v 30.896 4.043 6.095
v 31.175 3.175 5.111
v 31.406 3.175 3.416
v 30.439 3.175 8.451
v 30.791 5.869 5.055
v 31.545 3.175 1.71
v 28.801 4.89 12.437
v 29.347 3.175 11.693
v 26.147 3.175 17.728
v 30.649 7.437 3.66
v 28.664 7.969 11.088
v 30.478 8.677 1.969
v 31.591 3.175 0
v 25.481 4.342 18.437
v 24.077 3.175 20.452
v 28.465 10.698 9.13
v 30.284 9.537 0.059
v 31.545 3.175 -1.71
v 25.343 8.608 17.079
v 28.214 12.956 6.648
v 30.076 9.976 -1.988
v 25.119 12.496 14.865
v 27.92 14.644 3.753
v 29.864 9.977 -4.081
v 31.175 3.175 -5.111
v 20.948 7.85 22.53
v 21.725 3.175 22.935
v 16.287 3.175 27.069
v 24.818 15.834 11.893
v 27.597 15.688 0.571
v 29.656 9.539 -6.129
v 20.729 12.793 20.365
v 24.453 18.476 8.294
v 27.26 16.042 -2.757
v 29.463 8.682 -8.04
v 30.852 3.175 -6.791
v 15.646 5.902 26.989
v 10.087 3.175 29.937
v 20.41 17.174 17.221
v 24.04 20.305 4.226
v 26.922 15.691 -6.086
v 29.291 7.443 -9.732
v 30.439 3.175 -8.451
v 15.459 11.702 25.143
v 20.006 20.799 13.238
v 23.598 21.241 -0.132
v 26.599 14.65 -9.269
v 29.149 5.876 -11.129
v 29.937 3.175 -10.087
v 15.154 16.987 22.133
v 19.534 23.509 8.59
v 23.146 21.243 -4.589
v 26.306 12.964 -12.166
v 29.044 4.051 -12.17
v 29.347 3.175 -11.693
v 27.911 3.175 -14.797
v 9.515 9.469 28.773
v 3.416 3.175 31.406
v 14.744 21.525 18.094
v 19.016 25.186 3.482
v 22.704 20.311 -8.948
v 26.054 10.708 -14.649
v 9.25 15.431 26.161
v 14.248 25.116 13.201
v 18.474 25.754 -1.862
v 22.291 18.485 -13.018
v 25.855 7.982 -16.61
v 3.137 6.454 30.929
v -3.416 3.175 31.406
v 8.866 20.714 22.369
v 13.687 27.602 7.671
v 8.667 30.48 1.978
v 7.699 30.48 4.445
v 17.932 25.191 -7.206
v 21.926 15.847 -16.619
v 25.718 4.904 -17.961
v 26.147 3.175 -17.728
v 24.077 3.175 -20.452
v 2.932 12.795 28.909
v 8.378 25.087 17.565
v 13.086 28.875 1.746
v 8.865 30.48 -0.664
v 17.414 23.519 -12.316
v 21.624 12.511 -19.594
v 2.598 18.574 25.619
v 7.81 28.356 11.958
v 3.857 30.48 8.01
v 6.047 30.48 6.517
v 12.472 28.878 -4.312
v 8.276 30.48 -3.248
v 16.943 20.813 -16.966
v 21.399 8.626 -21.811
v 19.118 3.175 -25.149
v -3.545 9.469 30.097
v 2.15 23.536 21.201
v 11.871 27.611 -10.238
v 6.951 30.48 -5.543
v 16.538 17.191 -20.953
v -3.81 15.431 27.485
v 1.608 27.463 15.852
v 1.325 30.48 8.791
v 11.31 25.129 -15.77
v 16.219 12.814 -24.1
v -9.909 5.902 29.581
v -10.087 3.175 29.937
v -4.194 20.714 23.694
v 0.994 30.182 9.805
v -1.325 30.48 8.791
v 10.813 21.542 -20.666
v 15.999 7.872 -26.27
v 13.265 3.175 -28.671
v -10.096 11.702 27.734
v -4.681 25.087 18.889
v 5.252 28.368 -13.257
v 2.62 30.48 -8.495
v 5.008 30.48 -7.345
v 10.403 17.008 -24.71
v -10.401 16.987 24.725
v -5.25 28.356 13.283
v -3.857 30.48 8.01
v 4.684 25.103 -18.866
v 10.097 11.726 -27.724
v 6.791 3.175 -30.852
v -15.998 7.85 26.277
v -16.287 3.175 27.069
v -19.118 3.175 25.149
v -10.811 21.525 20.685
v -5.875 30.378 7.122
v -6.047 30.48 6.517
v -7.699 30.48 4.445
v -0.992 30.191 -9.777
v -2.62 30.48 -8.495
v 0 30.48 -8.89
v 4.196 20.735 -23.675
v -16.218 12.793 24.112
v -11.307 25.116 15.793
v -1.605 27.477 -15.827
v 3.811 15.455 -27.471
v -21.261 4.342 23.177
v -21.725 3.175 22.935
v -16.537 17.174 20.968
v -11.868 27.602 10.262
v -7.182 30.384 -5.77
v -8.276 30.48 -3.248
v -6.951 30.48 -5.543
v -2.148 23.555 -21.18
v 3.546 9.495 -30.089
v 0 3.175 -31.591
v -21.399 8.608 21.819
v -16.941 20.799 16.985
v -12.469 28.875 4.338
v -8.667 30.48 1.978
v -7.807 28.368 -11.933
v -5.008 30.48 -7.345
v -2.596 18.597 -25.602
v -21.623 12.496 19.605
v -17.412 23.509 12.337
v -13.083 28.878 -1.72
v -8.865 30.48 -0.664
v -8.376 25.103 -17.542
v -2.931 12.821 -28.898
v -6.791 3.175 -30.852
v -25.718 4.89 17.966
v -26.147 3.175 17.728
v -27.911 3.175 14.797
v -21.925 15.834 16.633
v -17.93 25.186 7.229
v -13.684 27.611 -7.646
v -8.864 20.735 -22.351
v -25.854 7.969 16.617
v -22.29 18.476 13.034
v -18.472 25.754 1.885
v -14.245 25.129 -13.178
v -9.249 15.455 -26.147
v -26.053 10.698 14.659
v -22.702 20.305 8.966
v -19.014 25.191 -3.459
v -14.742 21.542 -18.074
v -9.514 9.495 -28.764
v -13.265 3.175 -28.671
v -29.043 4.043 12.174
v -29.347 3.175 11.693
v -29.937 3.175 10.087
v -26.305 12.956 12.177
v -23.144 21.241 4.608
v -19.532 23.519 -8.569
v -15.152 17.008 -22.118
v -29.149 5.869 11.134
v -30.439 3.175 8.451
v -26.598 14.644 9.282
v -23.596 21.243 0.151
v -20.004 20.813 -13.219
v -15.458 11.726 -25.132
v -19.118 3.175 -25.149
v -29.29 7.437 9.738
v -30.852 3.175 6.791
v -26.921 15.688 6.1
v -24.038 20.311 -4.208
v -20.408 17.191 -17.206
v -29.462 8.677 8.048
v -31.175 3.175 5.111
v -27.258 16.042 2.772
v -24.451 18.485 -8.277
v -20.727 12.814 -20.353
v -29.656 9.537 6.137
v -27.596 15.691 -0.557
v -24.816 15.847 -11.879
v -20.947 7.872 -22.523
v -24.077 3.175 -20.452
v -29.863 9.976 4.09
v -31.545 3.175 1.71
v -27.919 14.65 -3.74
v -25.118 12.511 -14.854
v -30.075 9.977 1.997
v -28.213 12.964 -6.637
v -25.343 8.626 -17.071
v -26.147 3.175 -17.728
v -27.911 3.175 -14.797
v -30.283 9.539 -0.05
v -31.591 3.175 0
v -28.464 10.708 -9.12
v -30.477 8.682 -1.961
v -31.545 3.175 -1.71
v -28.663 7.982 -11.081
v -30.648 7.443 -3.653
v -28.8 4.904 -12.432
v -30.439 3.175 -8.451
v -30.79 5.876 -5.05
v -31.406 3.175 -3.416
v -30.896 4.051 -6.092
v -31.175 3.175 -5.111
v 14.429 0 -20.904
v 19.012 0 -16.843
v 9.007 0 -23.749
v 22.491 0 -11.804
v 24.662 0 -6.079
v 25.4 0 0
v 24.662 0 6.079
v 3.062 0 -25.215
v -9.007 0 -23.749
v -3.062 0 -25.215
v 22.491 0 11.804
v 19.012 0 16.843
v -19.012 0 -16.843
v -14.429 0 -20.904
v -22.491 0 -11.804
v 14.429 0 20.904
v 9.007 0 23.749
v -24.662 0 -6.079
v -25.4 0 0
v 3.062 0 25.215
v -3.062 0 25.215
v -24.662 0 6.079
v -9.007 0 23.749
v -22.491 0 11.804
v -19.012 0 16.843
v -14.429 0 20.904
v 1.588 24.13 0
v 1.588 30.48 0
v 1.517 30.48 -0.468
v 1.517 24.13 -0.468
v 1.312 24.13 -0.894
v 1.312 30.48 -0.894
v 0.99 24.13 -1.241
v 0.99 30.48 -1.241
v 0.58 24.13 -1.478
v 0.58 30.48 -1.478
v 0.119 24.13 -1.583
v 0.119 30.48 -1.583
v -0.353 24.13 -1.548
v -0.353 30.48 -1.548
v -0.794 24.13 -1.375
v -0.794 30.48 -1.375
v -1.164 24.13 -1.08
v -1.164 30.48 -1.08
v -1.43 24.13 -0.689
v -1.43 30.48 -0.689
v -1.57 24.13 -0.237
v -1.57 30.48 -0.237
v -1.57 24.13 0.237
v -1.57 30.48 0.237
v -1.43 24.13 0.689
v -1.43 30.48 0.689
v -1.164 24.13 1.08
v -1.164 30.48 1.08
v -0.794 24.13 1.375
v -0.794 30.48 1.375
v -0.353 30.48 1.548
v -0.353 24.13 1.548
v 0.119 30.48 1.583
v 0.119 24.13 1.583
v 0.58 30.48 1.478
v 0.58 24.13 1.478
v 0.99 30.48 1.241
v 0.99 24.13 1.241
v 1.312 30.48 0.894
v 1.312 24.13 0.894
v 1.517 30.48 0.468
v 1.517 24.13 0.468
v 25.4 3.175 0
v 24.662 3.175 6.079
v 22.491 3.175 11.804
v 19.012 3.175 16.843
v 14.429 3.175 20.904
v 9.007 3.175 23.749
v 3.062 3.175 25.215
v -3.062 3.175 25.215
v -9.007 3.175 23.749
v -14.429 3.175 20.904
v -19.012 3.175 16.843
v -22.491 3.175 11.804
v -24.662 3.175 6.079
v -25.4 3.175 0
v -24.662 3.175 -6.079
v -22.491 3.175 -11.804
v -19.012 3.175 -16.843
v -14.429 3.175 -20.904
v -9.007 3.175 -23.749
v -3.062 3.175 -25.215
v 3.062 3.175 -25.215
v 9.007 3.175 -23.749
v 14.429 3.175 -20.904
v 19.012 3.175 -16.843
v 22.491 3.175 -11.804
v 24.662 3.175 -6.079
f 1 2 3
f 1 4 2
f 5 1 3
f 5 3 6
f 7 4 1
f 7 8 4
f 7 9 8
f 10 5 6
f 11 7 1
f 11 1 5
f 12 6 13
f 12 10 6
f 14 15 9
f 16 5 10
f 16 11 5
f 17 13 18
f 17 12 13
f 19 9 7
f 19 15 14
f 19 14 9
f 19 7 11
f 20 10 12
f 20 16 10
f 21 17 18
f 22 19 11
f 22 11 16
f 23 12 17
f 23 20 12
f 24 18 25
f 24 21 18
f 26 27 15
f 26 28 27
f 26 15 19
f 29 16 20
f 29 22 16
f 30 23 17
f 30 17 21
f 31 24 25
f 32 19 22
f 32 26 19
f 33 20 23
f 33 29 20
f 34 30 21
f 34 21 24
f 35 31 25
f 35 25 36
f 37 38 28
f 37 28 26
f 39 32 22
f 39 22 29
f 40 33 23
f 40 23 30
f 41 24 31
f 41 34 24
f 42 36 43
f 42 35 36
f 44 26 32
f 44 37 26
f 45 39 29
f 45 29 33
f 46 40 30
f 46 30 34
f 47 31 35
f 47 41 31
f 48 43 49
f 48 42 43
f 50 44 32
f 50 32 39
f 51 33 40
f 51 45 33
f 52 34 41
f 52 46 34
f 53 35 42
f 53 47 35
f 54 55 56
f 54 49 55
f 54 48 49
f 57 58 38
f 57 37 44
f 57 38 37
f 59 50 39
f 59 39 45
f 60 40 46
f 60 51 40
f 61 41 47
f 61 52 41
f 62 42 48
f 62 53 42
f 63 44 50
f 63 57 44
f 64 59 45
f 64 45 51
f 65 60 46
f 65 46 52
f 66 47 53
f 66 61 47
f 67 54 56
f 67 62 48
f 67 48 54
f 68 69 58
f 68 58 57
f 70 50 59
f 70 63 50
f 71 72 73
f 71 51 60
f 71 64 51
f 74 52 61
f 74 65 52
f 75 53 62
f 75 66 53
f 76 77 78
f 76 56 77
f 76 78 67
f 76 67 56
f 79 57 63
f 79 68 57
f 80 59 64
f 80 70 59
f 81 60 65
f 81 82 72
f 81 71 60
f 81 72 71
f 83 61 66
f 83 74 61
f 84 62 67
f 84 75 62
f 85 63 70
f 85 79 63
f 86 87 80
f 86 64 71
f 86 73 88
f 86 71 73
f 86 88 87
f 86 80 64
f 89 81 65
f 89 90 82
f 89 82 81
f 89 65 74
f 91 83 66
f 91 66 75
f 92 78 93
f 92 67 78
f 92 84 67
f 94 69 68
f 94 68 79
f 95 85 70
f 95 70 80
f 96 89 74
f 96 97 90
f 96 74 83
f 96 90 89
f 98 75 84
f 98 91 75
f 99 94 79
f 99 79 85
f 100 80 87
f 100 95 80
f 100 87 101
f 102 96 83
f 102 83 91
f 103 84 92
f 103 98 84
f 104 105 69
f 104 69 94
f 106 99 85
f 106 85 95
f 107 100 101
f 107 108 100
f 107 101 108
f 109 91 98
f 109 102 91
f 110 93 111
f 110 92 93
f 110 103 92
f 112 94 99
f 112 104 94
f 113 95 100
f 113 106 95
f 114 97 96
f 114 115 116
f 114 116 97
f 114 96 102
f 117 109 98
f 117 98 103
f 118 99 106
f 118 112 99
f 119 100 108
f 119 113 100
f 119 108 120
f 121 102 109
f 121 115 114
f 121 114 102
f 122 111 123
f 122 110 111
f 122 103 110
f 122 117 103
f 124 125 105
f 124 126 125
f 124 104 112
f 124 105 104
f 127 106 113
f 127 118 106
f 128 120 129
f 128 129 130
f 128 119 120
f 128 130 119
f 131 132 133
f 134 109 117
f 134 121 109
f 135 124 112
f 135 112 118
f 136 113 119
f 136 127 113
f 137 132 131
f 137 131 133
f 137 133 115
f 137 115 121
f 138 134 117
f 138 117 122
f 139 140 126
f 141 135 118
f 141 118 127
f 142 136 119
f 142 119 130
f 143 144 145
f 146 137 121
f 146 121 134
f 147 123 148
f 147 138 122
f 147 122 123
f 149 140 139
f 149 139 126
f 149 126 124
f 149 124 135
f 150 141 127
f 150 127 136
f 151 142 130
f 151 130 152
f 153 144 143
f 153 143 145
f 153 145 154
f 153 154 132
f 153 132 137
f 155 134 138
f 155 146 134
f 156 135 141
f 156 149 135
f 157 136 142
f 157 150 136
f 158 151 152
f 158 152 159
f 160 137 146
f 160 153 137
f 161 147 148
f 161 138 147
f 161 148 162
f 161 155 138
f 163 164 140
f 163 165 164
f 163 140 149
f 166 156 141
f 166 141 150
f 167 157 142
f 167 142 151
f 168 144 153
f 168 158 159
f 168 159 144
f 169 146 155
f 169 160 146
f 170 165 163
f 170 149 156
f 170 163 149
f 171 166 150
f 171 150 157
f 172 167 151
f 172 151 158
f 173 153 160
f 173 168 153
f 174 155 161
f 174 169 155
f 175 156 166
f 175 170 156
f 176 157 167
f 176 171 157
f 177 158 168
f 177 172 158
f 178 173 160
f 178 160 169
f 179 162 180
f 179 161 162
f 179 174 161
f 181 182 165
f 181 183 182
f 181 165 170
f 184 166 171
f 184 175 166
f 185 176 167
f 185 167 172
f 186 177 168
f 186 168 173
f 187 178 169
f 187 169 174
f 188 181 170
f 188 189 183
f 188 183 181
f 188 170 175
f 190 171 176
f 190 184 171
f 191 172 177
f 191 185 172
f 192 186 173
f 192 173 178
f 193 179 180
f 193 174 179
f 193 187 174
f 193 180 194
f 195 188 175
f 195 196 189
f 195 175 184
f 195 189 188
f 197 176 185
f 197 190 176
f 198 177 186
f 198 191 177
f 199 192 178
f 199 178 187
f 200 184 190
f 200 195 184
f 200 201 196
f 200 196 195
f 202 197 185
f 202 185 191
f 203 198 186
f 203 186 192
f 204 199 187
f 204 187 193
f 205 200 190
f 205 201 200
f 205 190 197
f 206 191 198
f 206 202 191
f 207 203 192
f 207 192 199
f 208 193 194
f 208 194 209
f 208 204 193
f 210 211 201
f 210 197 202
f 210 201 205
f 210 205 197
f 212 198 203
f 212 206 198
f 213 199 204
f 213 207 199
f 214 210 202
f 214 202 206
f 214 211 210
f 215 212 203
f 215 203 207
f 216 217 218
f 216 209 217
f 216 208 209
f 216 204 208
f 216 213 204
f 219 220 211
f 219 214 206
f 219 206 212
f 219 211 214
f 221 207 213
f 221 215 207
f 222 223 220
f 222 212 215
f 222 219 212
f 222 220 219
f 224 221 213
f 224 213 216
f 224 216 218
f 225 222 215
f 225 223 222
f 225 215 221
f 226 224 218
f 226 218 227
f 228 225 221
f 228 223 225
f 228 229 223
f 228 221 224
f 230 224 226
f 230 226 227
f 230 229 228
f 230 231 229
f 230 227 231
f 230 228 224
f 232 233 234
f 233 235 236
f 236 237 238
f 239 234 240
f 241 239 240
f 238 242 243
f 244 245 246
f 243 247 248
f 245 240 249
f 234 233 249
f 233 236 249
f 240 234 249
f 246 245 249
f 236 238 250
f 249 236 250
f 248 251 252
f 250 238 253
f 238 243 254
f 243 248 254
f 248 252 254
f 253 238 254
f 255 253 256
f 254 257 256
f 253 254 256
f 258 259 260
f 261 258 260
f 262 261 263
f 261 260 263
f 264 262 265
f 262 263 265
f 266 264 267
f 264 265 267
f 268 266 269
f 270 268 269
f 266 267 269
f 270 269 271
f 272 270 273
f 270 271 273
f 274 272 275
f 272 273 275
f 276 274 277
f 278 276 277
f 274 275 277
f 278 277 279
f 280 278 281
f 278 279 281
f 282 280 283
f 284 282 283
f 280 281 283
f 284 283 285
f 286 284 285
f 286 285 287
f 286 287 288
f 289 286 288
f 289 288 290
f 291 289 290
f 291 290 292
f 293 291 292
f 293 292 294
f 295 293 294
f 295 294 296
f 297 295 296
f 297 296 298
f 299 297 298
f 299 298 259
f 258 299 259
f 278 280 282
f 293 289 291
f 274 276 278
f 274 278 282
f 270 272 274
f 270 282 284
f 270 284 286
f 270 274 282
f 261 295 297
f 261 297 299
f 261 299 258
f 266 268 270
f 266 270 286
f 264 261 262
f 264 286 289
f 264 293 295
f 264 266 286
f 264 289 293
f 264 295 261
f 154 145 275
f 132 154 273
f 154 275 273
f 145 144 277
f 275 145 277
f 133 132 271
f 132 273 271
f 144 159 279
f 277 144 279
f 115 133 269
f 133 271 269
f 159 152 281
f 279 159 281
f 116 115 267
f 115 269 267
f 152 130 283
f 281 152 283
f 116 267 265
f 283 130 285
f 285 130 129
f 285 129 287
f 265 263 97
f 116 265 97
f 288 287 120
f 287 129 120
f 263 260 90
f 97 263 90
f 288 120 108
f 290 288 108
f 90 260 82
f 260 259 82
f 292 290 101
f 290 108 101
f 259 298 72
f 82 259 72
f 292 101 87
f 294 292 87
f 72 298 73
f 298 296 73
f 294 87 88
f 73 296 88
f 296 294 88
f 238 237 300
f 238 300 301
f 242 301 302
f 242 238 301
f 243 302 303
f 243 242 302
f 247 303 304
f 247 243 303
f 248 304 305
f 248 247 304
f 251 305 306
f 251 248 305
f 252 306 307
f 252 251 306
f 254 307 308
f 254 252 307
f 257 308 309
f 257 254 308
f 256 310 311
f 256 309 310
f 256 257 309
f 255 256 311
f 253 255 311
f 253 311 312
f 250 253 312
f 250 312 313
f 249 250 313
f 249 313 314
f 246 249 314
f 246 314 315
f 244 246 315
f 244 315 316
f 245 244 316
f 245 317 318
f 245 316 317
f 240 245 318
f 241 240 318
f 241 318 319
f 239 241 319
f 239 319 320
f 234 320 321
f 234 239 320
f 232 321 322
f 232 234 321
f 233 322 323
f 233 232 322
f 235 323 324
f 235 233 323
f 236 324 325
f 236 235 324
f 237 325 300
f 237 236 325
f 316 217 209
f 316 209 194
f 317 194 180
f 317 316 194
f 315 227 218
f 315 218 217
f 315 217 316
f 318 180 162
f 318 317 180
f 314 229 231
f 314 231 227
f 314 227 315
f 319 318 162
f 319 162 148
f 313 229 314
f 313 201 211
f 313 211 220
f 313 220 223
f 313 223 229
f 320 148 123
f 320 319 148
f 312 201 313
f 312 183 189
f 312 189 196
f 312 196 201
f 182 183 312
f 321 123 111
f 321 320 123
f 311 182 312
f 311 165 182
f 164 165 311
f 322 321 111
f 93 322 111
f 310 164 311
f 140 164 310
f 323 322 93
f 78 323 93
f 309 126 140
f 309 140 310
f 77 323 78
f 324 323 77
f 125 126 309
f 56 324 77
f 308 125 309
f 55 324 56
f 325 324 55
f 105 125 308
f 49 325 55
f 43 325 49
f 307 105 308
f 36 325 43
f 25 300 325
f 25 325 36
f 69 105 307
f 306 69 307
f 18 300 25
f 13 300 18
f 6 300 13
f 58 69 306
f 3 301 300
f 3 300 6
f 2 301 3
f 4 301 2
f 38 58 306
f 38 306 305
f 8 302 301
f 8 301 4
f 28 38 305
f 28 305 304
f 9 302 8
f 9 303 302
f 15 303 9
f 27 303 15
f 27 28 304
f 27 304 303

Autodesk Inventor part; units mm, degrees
ref_plane "YZ Plane" through (0, 0, 0) normal (1, 0, 0) x (0, 1, 0)
ref_plane "XZ Plane" through (0, 0, 0) normal (0, 1, 0) x (-1, 0, 0)
ref_plane "XY Plane" through (0, 0, 0) normal (0, 0, 1) x (1, 0, 0)
sketch "Sketch1" plane through (0, 0, 0) normal (0, 1, 0) x (-1, 0, 0)
  arc A0 (-31.588, -3.2035) -> (31.588, 3.2035) centre (0, 0) ccw
  line L0 (0, 0) -> (-31.588, -3.2035) construction
  line L1 (0, 0) -> (31.588, 3.2035) construction
  line L2 (31.588, 3.2035) -> (-31.588, -3.2035)
revolve "Revolution1" add sketch "Sketch1" angle 180 about axis through (0, 0, 0) along (0.9948968, 0, -0.1008975)
sketch "Sketch2" plane through (0, 0, 0) normal (0, -1, 0) x (1, 0, 0)
  circle A0 centre (0, 0) radius 31.75
extrude "Extrusion1" cut sketch "Sketch2" against normal blind 30.48 keep common part
sketch "Sketch3" plane through (0, 0, 0) normal (0, -1, 0) x (1, 0, 0)
  line L0 (0, 0) -> (0, -27.94)
  circle A0 centre (0, 0) radius 8.89 projected
  line L1 (0, 0) -> (0, 25.4)
  circle A1 centre (0, 0) radius 27.94
  circle A2 centre (0, 0) radius 25.4
  dimension "d7" = 27.94
  dimension "d8" = 25.4
extrude "Extrusion2" cut sketch "Sketch3" against normal blind 3.175
sketch "Sketch4" plane through (0, 30.48, 0) normal (0, 1, 0) x (1, 0, 0)
  circle A0 centre (0, 0) radius 1.5875
  dimension "d11" = 3.175
extrude "Extrusion3" cut sketch "Sketch4" against normal blind 6.35
sketch "Sketch5" plane through (0, 0, 0) normal (0, -1, 0) x (1, 0, 0)
  circle A0 centre (0, 0) radius 1.5875 projected
  circle A1 centre (0, 0) radius 31.75
  circle A2 centre (0, 0) radius 27.94
extrude "Extrusion4" cut sketch "Sketch5" against normal blind 3.175 contours A1
properties part number "ball tops"
